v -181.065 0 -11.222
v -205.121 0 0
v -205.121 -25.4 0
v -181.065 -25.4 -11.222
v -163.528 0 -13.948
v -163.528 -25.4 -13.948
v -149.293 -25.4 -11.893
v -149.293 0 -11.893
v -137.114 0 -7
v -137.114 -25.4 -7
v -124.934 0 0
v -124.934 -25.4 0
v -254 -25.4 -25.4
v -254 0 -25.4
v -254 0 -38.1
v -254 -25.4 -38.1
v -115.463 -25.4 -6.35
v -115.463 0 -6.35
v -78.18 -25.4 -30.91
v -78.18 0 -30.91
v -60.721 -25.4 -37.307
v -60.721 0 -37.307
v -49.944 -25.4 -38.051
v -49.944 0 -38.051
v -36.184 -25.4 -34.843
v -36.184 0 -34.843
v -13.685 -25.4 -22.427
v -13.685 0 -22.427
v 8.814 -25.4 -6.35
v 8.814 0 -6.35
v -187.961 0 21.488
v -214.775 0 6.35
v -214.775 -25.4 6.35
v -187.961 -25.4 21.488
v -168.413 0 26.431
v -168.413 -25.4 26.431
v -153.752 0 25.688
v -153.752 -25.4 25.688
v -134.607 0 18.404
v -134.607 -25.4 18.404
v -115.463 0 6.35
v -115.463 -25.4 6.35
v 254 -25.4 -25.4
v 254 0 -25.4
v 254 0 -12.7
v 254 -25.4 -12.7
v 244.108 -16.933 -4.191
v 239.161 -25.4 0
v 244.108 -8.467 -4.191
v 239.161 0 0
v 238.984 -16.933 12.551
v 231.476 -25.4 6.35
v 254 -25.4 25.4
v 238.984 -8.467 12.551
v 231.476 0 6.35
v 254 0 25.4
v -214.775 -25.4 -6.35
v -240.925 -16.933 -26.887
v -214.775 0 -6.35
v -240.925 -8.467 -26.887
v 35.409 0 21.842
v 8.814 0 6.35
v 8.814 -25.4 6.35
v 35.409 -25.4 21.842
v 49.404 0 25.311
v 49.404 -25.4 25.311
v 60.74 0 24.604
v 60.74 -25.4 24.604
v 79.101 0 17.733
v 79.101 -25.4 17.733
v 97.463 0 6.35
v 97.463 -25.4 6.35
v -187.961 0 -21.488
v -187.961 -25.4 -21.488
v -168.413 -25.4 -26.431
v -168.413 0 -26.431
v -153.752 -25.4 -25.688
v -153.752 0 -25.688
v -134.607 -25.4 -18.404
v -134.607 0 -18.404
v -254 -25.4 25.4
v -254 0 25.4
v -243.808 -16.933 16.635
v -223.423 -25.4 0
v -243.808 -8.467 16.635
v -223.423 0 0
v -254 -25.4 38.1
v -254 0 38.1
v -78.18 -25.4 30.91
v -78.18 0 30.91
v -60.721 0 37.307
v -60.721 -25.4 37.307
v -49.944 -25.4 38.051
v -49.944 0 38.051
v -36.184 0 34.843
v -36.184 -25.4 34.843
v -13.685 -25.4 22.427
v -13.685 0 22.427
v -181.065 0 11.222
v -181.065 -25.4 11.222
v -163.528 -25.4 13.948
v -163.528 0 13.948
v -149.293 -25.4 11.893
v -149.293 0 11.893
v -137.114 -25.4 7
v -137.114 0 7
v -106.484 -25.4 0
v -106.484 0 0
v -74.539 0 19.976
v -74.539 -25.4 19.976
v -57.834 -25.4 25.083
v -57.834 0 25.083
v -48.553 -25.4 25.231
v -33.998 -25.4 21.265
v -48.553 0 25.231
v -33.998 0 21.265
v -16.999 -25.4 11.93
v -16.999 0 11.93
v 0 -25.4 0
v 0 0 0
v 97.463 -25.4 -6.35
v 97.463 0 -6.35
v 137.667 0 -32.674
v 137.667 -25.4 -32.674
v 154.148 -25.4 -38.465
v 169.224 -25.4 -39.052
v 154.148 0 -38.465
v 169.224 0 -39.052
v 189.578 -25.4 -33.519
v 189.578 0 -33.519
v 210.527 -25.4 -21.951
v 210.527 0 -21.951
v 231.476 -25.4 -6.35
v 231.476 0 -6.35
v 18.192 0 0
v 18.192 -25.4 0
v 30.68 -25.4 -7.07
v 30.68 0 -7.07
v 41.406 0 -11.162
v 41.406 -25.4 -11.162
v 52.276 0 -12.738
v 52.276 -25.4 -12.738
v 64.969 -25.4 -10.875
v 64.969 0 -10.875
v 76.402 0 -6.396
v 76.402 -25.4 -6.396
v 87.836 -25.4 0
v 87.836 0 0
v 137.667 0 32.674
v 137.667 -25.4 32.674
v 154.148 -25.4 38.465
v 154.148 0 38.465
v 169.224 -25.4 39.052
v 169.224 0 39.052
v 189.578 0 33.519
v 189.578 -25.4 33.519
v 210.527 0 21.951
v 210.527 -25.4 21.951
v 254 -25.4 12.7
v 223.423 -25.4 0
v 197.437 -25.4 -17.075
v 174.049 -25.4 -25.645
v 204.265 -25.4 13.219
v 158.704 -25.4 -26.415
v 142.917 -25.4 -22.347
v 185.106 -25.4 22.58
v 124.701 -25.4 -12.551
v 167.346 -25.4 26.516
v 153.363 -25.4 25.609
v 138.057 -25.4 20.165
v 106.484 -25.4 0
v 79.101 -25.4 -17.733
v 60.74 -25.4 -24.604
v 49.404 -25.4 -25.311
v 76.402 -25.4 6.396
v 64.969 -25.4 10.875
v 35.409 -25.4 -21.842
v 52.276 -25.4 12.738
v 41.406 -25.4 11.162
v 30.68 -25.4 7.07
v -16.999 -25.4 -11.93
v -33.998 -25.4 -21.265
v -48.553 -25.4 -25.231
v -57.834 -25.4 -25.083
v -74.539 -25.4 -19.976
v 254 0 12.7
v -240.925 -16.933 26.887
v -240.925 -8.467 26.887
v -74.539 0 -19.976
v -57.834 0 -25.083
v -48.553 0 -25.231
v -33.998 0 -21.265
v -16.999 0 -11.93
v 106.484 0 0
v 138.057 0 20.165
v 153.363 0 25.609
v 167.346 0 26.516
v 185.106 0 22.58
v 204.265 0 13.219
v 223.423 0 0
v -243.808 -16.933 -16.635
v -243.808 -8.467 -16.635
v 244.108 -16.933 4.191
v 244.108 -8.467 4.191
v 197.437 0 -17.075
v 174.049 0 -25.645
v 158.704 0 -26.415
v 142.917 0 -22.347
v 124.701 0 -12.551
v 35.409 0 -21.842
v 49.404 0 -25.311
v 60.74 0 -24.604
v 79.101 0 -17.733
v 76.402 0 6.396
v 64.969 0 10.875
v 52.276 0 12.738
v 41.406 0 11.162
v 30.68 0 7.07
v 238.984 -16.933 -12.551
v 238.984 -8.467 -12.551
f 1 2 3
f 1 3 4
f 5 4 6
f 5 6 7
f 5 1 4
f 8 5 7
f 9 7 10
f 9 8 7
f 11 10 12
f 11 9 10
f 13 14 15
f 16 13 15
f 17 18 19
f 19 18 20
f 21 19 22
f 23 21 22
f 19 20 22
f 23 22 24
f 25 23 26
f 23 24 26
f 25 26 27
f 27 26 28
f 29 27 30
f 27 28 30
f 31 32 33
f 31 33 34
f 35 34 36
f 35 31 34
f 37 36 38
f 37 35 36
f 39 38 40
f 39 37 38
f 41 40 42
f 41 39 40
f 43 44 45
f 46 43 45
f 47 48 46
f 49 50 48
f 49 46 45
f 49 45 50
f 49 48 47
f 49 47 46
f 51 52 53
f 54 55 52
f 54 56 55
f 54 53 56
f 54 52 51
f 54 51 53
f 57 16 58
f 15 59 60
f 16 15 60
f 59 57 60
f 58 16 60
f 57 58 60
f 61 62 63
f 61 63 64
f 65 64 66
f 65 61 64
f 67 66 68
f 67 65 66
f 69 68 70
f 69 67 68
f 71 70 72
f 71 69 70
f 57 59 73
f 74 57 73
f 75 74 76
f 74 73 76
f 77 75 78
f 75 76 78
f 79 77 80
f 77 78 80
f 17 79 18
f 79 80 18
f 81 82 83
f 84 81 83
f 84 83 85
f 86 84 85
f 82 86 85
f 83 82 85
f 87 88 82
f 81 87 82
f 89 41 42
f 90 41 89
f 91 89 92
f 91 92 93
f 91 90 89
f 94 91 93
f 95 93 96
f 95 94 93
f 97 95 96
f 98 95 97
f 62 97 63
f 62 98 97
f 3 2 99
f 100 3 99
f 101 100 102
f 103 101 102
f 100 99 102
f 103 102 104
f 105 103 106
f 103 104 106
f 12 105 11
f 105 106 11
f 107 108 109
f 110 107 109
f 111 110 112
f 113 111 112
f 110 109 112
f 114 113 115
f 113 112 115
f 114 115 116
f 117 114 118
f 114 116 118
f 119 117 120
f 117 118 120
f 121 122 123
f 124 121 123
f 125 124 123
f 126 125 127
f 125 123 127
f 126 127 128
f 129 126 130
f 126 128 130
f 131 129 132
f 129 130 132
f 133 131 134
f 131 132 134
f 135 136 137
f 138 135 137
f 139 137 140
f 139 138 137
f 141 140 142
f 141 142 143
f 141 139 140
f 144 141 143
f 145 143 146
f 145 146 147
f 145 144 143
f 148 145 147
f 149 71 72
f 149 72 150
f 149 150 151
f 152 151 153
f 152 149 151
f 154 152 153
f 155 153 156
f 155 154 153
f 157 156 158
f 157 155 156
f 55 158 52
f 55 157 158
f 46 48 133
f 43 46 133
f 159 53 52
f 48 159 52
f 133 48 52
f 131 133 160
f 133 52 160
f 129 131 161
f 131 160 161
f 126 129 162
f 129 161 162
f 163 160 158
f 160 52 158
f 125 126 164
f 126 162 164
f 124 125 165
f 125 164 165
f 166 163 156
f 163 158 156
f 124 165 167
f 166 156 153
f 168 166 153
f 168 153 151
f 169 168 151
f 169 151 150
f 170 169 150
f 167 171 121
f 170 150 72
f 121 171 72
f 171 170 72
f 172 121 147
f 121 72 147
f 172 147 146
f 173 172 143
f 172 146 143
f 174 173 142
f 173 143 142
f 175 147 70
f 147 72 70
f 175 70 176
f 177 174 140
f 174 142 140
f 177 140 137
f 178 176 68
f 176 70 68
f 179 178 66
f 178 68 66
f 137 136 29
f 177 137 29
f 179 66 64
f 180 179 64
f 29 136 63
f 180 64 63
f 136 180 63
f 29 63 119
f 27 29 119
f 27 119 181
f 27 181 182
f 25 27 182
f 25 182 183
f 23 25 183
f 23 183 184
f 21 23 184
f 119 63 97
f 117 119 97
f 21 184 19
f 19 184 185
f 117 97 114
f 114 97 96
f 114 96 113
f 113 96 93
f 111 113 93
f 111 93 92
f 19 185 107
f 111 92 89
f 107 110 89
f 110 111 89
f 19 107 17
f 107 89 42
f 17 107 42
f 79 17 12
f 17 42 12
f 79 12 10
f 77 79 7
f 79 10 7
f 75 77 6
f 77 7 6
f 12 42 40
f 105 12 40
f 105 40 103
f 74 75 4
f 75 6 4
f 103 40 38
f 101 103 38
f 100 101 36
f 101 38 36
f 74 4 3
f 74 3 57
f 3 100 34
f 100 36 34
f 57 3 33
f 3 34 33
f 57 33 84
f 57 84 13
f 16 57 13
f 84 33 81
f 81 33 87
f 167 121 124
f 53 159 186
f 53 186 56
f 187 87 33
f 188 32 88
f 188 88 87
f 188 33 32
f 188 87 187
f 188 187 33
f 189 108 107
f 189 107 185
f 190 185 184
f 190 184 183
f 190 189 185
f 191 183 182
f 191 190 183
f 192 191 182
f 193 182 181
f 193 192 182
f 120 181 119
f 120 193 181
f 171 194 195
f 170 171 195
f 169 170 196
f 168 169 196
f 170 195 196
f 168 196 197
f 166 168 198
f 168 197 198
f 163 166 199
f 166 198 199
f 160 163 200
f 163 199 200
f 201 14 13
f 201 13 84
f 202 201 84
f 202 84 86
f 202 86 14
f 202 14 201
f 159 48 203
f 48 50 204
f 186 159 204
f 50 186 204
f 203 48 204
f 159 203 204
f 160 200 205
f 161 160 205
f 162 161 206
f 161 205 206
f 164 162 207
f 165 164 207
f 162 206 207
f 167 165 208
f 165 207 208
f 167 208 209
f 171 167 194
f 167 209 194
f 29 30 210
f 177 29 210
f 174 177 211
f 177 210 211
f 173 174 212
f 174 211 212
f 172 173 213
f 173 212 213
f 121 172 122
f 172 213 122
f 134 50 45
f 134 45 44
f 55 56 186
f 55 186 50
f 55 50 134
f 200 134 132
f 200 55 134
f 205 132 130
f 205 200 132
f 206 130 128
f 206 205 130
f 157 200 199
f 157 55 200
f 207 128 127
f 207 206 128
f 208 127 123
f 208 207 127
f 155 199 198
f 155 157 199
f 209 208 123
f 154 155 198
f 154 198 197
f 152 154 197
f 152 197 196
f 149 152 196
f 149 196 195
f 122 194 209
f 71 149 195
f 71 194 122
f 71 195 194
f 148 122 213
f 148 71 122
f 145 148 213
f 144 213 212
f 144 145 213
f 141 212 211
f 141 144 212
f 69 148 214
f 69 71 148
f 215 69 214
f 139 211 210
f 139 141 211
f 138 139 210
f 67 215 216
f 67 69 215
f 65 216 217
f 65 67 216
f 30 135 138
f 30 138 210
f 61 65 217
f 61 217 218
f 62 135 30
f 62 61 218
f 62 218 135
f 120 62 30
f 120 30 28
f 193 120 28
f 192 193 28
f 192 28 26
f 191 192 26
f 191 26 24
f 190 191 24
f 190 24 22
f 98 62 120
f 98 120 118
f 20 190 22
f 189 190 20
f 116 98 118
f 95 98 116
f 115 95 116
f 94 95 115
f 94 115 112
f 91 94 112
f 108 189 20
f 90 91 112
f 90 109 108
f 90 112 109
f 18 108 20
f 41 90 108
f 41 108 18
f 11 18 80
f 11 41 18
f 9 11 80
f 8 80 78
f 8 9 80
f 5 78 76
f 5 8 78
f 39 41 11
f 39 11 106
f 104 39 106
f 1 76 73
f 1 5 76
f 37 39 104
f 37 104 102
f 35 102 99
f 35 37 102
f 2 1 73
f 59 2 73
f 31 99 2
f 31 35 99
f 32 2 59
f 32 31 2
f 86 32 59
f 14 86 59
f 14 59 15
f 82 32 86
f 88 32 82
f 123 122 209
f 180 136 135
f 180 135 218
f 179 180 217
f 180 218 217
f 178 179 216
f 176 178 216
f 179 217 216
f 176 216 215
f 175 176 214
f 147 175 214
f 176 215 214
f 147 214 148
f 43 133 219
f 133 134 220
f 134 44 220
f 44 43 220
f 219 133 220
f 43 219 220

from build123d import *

# Parameters (mm, degrees)
F1_DEPTH = 25.4


with BuildPart() as f1:
    # F0 (on Front) → F1 (new body)
    with BuildSketch(Plane.XZ):
        with BuildLine():
            add(Edge.make_bspline(
                [(-214.7751562029, -6.35), (-211.5570208021, -4.093973735), (-208.3388854013, -1.9667404666), (-205.1207500005, 0)],
                knots=[0.0772142594, 0.0772142594, 0.0772142594, 0.0772142594, 0.0962189961, 0.0962189961, 0.0962189961, 0.0962189961], degree=3))
            add(Edge.make_bspline(
                [(-214.7751562029, -6.35), (-193.9834374686, -20.9257271579), (-160.8792672429, -35.5732524158), (-127.7750970172, -14.9202237117), (-115.4626455258, -6.35)],
                knots=[0.0772142594, 0.0772142594, 0.0772142594, 0.0772142594, 0.2, 0.2727113277, 0.2727113277, 0.2727113277, 0.2727113277], degree=3))
            add(Edge.make_bspline(
                [(-124.933999452, 0), (-121.7768814766, -2.0133370092), (-118.6197635012, -4.1524516602), (-115.4626455258, -6.35)],
                knots=[0.2540669302, 0.2540669302, 0.2540669302, 0.2540669302, 0.2727113277, 0.2727113277, 0.2727113277, 0.2727113277], degree=3))
            add(Edge.make_bspline(
                [(-205.1207500005, 0), (-187.547166667, -10.7399699454), (-160.8182498175, -19.7958733422), (-134.089332968, -5.8384805203), (-124.933999452, 0)],
                knots=[0.0962189961, 0.0962189961, 0.0962189961, 0.0962189961, 0.2, 0.2540669302, 0.2540669302, 0.2540669302, 0.2540669302], degree=3))
        make_face()
        with BuildLine():
            add(Edge.make_bspline(
                [(-214.7751562029, 6.35), (-193.9834374686, 20.9257271579), (-160.8792672429, 35.5732524158), (-127.7750970172, 14.9202237117), (-115.4626455258, 6.35)],
                knots=[0.0772142594, 0.0772142594, 0.0772142594, 0.0772142594, 0.2, 0.2727113277, 0.2727113277, 0.2727113277, 0.2727113277], degree=3))
            add(Edge.make_bspline(
                [(-214.7751562029, 6.35), (-211.5570208021, 4.093973735), (-208.3388854013, 1.9667404666), (-205.1207500005, 0)],
                knots=[0.0772142594, 0.0772142594, 0.0772142594, 0.0772142594, 0.0962189961, 0.0962189961, 0.0962189961, 0.0962189961], degree=3))
            add(Edge.make_bspline(
                [(-205.1207500005, 0), (-187.547166667, 10.7399699454), (-160.8182498175, 19.7958733422), (-134.089332968, 5.8384805203), (-124.933999452, 0)],
                knots=[0.0962189961, 0.0962189961, 0.0962189961, 0.0962189961, 0.2, 0.2540669302, 0.2540669302, 0.2540669302, 0.2540669302], degree=3))
            add(Edge.make_bspline(
                [(-124.933999452, 0), (-121.7768814766, 2.0133370092), (-118.6197635012, 4.1524516602), (-115.4626455258, 6.35)],
                knots=[0.2540669302, 0.2540669302, 0.2540669302, 0.2540669302, 0.2727113277, 0.2727113277, 0.2727113277, 0.2727113277], degree=3))
        make_face()
        with BuildLine():
            add(Edge.make_bspline(
                [(-223.4234286462, 0), (-220.5406711651, 2.2048234714), (-217.657913684, 4.3290854694), (-214.7751562029, 6.35)],
                knots=[0.0601901011, 0.0601901011, 0.0601901011, 0.0601901011, 0.0772142594, 0.0772142594, 0.0772142594, 0.0772142594], degree=3))
            add(Edge.make_bspline(
                [(-223.4234286462, 0), (-220.5406711651, -2.2048234714), (-217.657913684, -4.3290854694), (-214.7751562029, -6.35)],
                knots=[0.0601901011, 0.0601901011, 0.0601901011, 0.0601901011, 0.0772142594, 0.0772142594, 0.0772142594, 0.0772142594], degree=3))
            add(Edge.make_bspline(
                [(-214.7751562029, -6.35), (-211.5570208021, -4.093973735), (-208.3388854013, -1.9667404666), (-205.1207500005, 0)],
                knots=[0.0772142594, 0.0772142594, 0.0772142594, 0.0772142594, 0.0962189961, 0.0962189961, 0.0962189961, 0.0962189961], degree=3))
            add(Edge.make_bspline(
                [(-214.7751562029, 6.35), (-211.5570208021, 4.093973735), (-208.3388854013, 1.9667404666), (-205.1207500005, 0)],
                knots=[0.0772142594, 0.0772142594, 0.0772142594, 0.0772142594, 0.0962189961, 0.0962189961, 0.0962189961, 0.0962189961], degree=3))
        make_face()
        with BuildLine():
            add(Edge.make_bspline(
                [(-254, -25.4), (-243.8078095487, -16.5976537012), (-233.6156190975, -7.7953074024), (-223.4234286462, 0)],
                knots=[0, 0, 0, 0, 0.0601901011, 0.0601901011, 0.0601901011, 0.0601901011], degree=3))
            Line((-254, -25.4), (-254, -38.1))
            add(Edge.make_bspline(
                [(-254, -38.1), (-240.9250520676, -26.807999513), (-227.8501041353, -15.5159990259), (-214.7751562029, -6.35)],
                knots=[0, 0, 0, 0, 0.0772142594, 0.0772142594, 0.0772142594, 0.0772142594], degree=3))
            add(Edge.make_bspline(
                [(-223.4234286462, 0), (-220.5406711651, -2.2048234714), (-217.657913684, -4.3290854694), (-214.7751562029, -6.35)],
                knots=[0.0601901011, 0.0601901011, 0.0601901011, 0.0601901011, 0.0772142594, 0.0772142594, 0.0772142594, 0.0772142594], degree=3))
        make_face()
        with BuildLine():
            add(Edge.make_bspline(
                [(-254, 25.4), (-243.8078095487, 16.5976537012), (-233.6156190975, 7.7953074024), (-223.4234286462, 0)],
                knots=[0, 0, 0, 0, 0.0601901011, 0.0601901011, 0.0601901011, 0.0601901011], degree=3))
            add(Edge.make_bspline(
                [(-223.4234286462, 0), (-220.5406711651, 2.2048234714), (-217.657913684, 4.3290854694), (-214.7751562029, 6.35)],
                knots=[0.0601901011, 0.0601901011, 0.0601901011, 0.0601901011, 0.0772142594, 0.0772142594, 0.0772142594, 0.0772142594], degree=3))
            add(Edge.make_bspline(
                [(-254, 38.1), (-240.9250520676, 26.807999513), (-227.8501041353, 15.5159990259), (-214.7751562029, 6.35)],
                knots=[0, 0, 0, 0, 0.0772142594, 0.0772142594, 0.0772142594, 0.0772142594], degree=3))
            Line((-254, 38.1), (-254, 25.4))
        make_face()
        with BuildLine():
            add(Edge.make_bspline(
                [(-115.4626455258, -6.35), (-112.4696958715, -4.2667229116), (-109.4767462173, -2.1309311697), (-106.4837965631, 0)],
                knots=[0.2727113277, 0.2727113277, 0.2727113277, 0.2727113277, 0.2903862272, 0.2903862272, 0.2903862272, 0.2903862272], degree=3))
            add(Edge.make_bspline(
                [(-115.4626455258, -6.35), (-93.9084303505, -21.3530597976), (-52.4828246794, -55.4224209823), (-11.0572190083, -20.3940403676), (8.8141714876, -6.35)],
                knots=[0.2727113277, 0.2727113277, 0.2727113277, 0.2727113277, 0.4, 0.5173507313, 0.5173507313, 0.5173507313, 0.5173507313], degree=3))
            add(Edge.make_bspline(
                [(0, 0), (2.9380571625, -2.1367688455), (5.8761143251, -4.273537691), (8.8141714876, -6.35)],
                knots=[0.5, 0.5, 0.5, 0.5, 0.5173507313, 0.5173507313, 0.5173507313, 0.5173507313], degree=3))
            add(Edge.make_bspline(
                [(-106.4837965631, 0), (-87.9225310421, -13.2153172678), (-52.4279321877, -38.1294052274), (-16.9333333333, -12.3151515152), (0, 0)],
                knots=[0.2903862272, 0.2903862272, 0.2903862272, 0.2903862272, 0.4, 0.5, 0.5, 0.5, 0.5], degree=3))
        make_face()
        with BuildLine():
            add(Edge.make_bspline(
                [(-115.4626455258, 6.35), (-112.4696958715, 4.2667229116), (-109.4767462173, 2.1309311697), (-106.4837965631, 0)],
                knots=[0.2727113277, 0.2727113277, 0.2727113277, 0.2727113277, 0.2903862272, 0.2903862272, 0.2903862272, 0.2903862272], degree=3))
            add(Edge.make_bspline(
                [(-124.933999452, 0), (-121.7768814766, 2.0133370092), (-118.6197635012, 4.1524516602), (-115.4626455258, 6.35)],
                knots=[0.2540669302, 0.2540669302, 0.2540669302, 0.2540669302, 0.2727113277, 0.2727113277, 0.2727113277, 0.2727113277], degree=3))
            add(Edge.make_bspline(
                [(-124.933999452, 0), (-121.7768814766, -2.0133370092), (-118.6197635012, -4.1524516602), (-115.4626455258, -6.35)],
                knots=[0.2540669302, 0.2540669302, 0.2540669302, 0.2540669302, 0.2727113277, 0.2727113277, 0.2727113277, 0.2727113277], degree=3))
            add(Edge.make_bspline(
                [(-115.4626455258, -6.35), (-112.4696958715, -4.2667229116), (-109.4767462173, -2.1309311697), (-106.4837965631, 0)],
                knots=[0.2727113277, 0.2727113277, 0.2727113277, 0.2727113277, 0.2903862272, 0.2903862272, 0.2903862272, 0.2903862272], degree=3))
        make_face()
        with BuildLine():
            add(Edge.make_bspline(
                [(-115.4626455258, 6.35), (-93.9084303505, 21.3530597976), (-52.4828246794, 55.4224209823), (-11.0572190083, 20.3940403676), (8.8141714876, 6.35)],
                knots=[0.2727113277, 0.2727113277, 0.2727113277, 0.2727113277, 0.4, 0.5173507313, 0.5173507313, 0.5173507313, 0.5173507313], degree=3))
            add(Edge.make_bspline(
                [(-115.4626455258, 6.35), (-112.4696958715, 4.2667229116), (-109.4767462173, 2.1309311697), (-106.4837965631, 0)],
                knots=[0.2727113277, 0.2727113277, 0.2727113277, 0.2727113277, 0.2903862272, 0.2903862272, 0.2903862272, 0.2903862272], degree=3))
            add(Edge.make_bspline(
                [(-106.4837965631, 0), (-87.9225310421, 13.2153172678), (-52.4279321877, 38.1294052274), (-16.9333333333, 12.3151515152), (0, 0)],
                knots=[0.2903862272, 0.2903862272, 0.2903862272, 0.2903862272, 0.4, 0.5, 0.5, 0.5, 0.5], degree=3))
            add(Edge.make_bspline(
                [(0, 0), (2.9380571625, 2.1367688455), (5.8761143251, 4.273537691), (8.8141714876, 6.35)],
                knots=[0.5, 0.5, 0.5, 0.5, 0.5173507313, 0.5173507313, 0.5173507313, 0.5173507313], degree=3))
        make_face()
        with BuildLine():
            add(Edge.make_bspline(
                [(8.8141714876, -6.35), (11.9399480407, -4.1408676244), (15.0657245938, -1.9999942239), (18.1915011468, 0)],
                knots=[0.5173507313, 0.5173507313, 0.5173507313, 0.5173507313, 0.5358100416, 0.5358100416, 0.5358100416, 0.5358100416], degree=3))
            add(Edge.make_bspline(
                [(8.8141714876, -6.35), (22.8094476584, -16.2411157495), (52.3589401975, -34.2359377937), (81.9084327366, -17.0725968822), (97.4626491049, -6.35)],
                knots=[0.5173507313, 0.5173507313, 0.5173507313, 0.5173507313, 0.6, 0.6918556085, 0.6918556085, 0.6918556085, 0.6918556085], degree=3))
            add(Edge.make_bspline(
                [(87.8360827577, 0), (91.0449382067, -1.9976776152), (94.2537936558, -4.1379140537), (97.4626491049, -6.35)],
                knots=[0.6729056747, 0.6729056747, 0.6729056747, 0.6729056747, 0.6918556085, 0.6918556085, 0.6918556085, 0.6918556085], degree=3))
            add(Edge.make_bspline(
                [(18.1915011468, 0), (29.0610007646, -6.9547314348), (52.2758613015, -18.1701405375), (75.4907218384, -7.6856223508), (87.8360827577, 0)],
                knots=[0.5358100416, 0.5358100416, 0.5358100416, 0.5358100416, 0.6, 0.6729056747, 0.6729056747, 0.6729056747, 0.6729056747], degree=3))
        make_face()
        with BuildLine():
            add(Edge.make_bspline(
                [(8.8141714876, 6.35), (22.8094476584, 16.2411157495), (52.3589401975, 34.2359377937), (81.9084327366, 17.0725968822), (97.4626491049, 6.35)],
                knots=[0.5173507313, 0.5173507313, 0.5173507313, 0.5173507313, 0.6, 0.6918556085, 0.6918556085, 0.6918556085, 0.6918556085], degree=3))
            add(Edge.make_bspline(
                [(8.8141714876, 6.35), (11.9399480407, 4.1408676244), (15.0657245938, 1.9999942239), (18.1915011468, 0)],
                knots=[0.5173507313, 0.5173507313, 0.5173507313, 0.5173507313, 0.5358100416, 0.5358100416, 0.5358100416, 0.5358100416], degree=3))
            add(Edge.make_bspline(
                [(18.1915011468, 0), (29.0610007646, 6.9547314348), (52.2758613015, 18.1701405375), (75.4907218384, 7.6856223508), (87.8360827577, 0)],
                knots=[0.5358100416, 0.5358100416, 0.5358100416, 0.5358100416, 0.6, 0.6729056747, 0.6729056747, 0.6729056747, 0.6729056747], degree=3))
            add(Edge.make_bspline(
                [(87.8360827577, 0), (91.0449382067, 1.9976776152), (94.2537936558, 4.1379140537), (97.4626491049, 6.35)],
                knots=[0.6729056747, 0.6729056747, 0.6729056747, 0.6729056747, 0.6918556085, 0.6918556085, 0.6918556085, 0.6918556085], degree=3))
        make_face()
        with BuildLine():
            add(Edge.make_bspline(
                [(8.8141714876, 6.35), (11.9399480407, 4.1408676244), (15.0657245938, 1.9999942239), (18.1915011468, 0)],
                knots=[0.5173507313, 0.5173507313, 0.5173507313, 0.5173507313, 0.5358100416, 0.5358100416, 0.5358100416, 0.5358100416], degree=3))
            add(Edge.make_bspline(
                [(0, 0), (2.9380571625, 2.1367688455), (5.8761143251, 4.273537691), (8.8141714876, 6.35)],
                knots=[0.5, 0.5, 0.5, 0.5, 0.5173507313, 0.5173507313, 0.5173507313, 0.5173507313], degree=3))
            add(Edge.make_bspline(
                [(0, 0), (2.9380571625, -2.1367688455), (5.8761143251, -4.273537691), (8.8141714876, -6.35)],
                knots=[0.5, 0.5, 0.5, 0.5, 0.5173507313, 0.5173507313, 0.5173507313, 0.5173507313], degree=3))
            add(Edge.make_bspline(
                [(8.8141714876, -6.35), (11.9399480407, -4.1408676244), (15.0657245938, -1.9999942239), (18.1915011468, 0)],
                knots=[0.5173507313, 0.5173507313, 0.5173507313, 0.5173507313, 0.5358100416, 0.5358100416, 0.5358100416, 0.5358100416], degree=3))
        make_face()
        with BuildLine():
            add(Edge.make_bspline(
                [(97.4626491049, -6.35), (100.4696982576, -4.2770330882), (103.4767474103, -2.1409697819), (106.4837965631, 0)],
                knots=[0.6918556085, 0.6918556085, 0.6918556085, 0.6918556085, 0.7096137728, 0.7096137728, 0.7096137728, 0.7096137728], degree=3))
            add(Edge.make_bspline(
                [(97.4626491049, -6.35), (115.7750994032, -18.974038256), (160.4462157888, -55.4770957998), (205.1173321744, -27.7010633214), (231.4759982616, -6.35)],
                knots=[0.6918556085, 0.6918556085, 0.6918556085, 0.6918556085, 0.8, 0.9556614139, 0.9556614139, 0.9556614139, 0.9556614139], degree=3))
            add(Edge.make_bspline(
                [(223.4234286462, 0), (226.107618518, -2.0529527266), (228.7918083898, -4.1757508278), (231.4759982616, -6.35)],
                knots=[0.9398098989, 0.9398098989, 0.9398098989, 0.9398098989, 0.9556614139, 0.9556614139, 0.9556614139, 0.9556614139], degree=3))
            add(Edge.make_bspline(
                [(106.4837965631, 0), (121.7891977087, -10.8971951197), (160.7690750698, -38.9739529901), (199.7489524308, -18.1069830447), (223.4234286462, 0)],
                knots=[0.7096137728, 0.7096137728, 0.7096137728, 0.7096137728, 0.8, 0.9398098989, 0.9398098989, 0.9398098989, 0.9398098989], degree=3))
        make_face()
        with BuildLine():
            add(Edge.make_bspline(
                [(97.4626491049, 6.35), (100.4696982576, 4.2770330882), (103.4767474103, 2.1409697819), (106.4837965631, 0)],
                knots=[0.6918556085, 0.6918556085, 0.6918556085, 0.6918556085, 0.7096137728, 0.7096137728, 0.7096137728, 0.7096137728], degree=3))
            add(Edge.make_bspline(
                [(87.8360827577, 0), (91.0449382067, 1.9976776152), (94.2537936558, 4.1379140537), (97.4626491049, 6.35)],
                knots=[0.6729056747, 0.6729056747, 0.6729056747, 0.6729056747, 0.6918556085, 0.6918556085, 0.6918556085, 0.6918556085], degree=3))
            add(Edge.make_bspline(
                [(87.8360827577, 0), (91.0449382067, -1.9976776152), (94.2537936558, -4.1379140537), (97.4626491049, -6.35)],
                knots=[0.6729056747, 0.6729056747, 0.6729056747, 0.6729056747, 0.6918556085, 0.6918556085, 0.6918556085, 0.6918556085], degree=3))
            add(Edge.make_bspline(
                [(97.4626491049, -6.35), (100.4696982576, -4.2770330882), (103.4767474103, -2.1409697819), (106.4837965631, 0)],
                knots=[0.6918556085, 0.6918556085, 0.6918556085, 0.6918556085, 0.7096137728, 0.7096137728, 0.7096137728, 0.7096137728], degree=3))
        make_face()
        with BuildLine():
            add(Edge.make_bspline(
                [(97.4626491049, 6.35), (115.7750994032, 18.974038256), (160.4462157888, 55.4770957998), (205.1173321744, 27.7010633214), (231.4759982616, 6.35)],
                knots=[0.6918556085, 0.6918556085, 0.6918556085, 0.6918556085, 0.8, 0.9556614139, 0.9556614139, 0.9556614139, 0.9556614139], degree=3))
            add(Edge.make_bspline(
                [(97.4626491049, 6.35), (100.4696982576, 4.2770330882), (103.4767474103, 2.1409697819), (106.4837965631, 0)],
                knots=[0.6918556085, 0.6918556085, 0.6918556085, 0.6918556085, 0.7096137728, 0.7096137728, 0.7096137728, 0.7096137728], degree=3))
            add(Edge.make_bspline(
                [(106.4837965631, 0), (121.7891977087, 10.8971951197), (160.7690750698, 38.9739529901), (199.7489524308, 18.1069830447), (223.4234286462, 0)],
                knots=[0.7096137728, 0.7096137728, 0.7096137728, 0.7096137728, 0.8, 0.9398098989, 0.9398098989, 0.9398098989, 0.9398098989], degree=3))
            add(Edge.make_bspline(
                [(223.4234286462, 0), (226.107618518, 2.0529527266), (228.7918083898, 4.1757508278), (231.4759982616, 6.35)],
                knots=[0.9398098989, 0.9398098989, 0.9398098989, 0.9398098989, 0.9556614139, 0.9556614139, 0.9556614139, 0.9556614139], degree=3))
        make_face()
        with BuildLine():
            add(Edge.make_bspline(
                [(231.4759982616, -6.35), (234.0378222269, -4.2748697365), (236.5996461922, -2.1528725416), (239.1614701575, 0)],
                knots=[0.9556614139, 0.9556614139, 0.9556614139, 0.9556614139, 0.9707902956, 0.9707902956, 0.9707902956, 0.9707902956], degree=3))
            add(Edge.make_bspline(
                [(231.4759982616, -6.35), (238.983998841, -12.4316353627), (246.4919994205, -18.9158176814), (254, -25.4)],
                knots=[0.9556614139, 0.9556614139, 0.9556614139, 0.9556614139, 1, 1, 1, 1], degree=3))
            Line((254, -25.4), (254, -12.7))
            add(Edge.make_bspline(
                [(239.1614701575, 0), (244.1076467717, -4.1566040301), (249.0538233858, -8.428302015), (254, -12.7)],
                knots=[0.9707902956, 0.9707902956, 0.9707902956, 0.9707902956, 1, 1, 1, 1], degree=3))
        make_face()
        with BuildLine():
            add(Edge.make_bspline(
                [(231.4759982616, 6.35), (238.983998841, 12.4316353627), (246.4919994205, 18.9158176814), (254, 25.4)],
                knots=[0.9556614139, 0.9556614139, 0.9556614139, 0.9556614139, 1, 1, 1, 1], degree=3))
            add(Edge.make_bspline(
                [(231.4759982616, 6.35), (234.0378222269, 4.2748697365), (236.5996461922, 2.1528725416), (239.1614701575, 0)],
                knots=[0.9556614139, 0.9556614139, 0.9556614139, 0.9556614139, 0.9707902956, 0.9707902956, 0.9707902956, 0.9707902956], degree=3))
            add(Edge.make_bspline(
                [(239.1614701575, 0), (244.1076467717, 4.1566040301), (249.0538233858, 8.428302015), (254, 12.7)],
                knots=[0.9707902956, 0.9707902956, 0.9707902956, 0.9707902956, 1, 1, 1, 1], degree=3))
            Line((254, 12.7), (254, 25.4))
        make_face()
        with BuildLine():
            add(Edge.make_bspline(
                [(231.4759982616, 6.35), (234.0378222269, 4.2748697365), (236.5996461922, 2.1528725416), (239.1614701575, 0)],
                knots=[0.9556614139, 0.9556614139, 0.9556614139, 0.9556614139, 0.9707902956, 0.9707902956, 0.9707902956, 0.9707902956], degree=3))
            add(Edge.make_bspline(
                [(223.4234286462, 0), (226.107618518, 2.0529527266), (228.7918083898, 4.1757508278), (231.4759982616, 6.35)],
                knots=[0.9398098989, 0.9398098989, 0.9398098989, 0.9398098989, 0.9556614139, 0.9556614139, 0.9556614139, 0.9556614139], degree=3))
            add(Edge.make_bspline(
                [(223.4234286462, 0), (226.107618518, -2.0529527266), (228.7918083898, -4.1757508278), (231.4759982616, -6.35)],
                knots=[0.9398098989, 0.9398098989, 0.9398098989, 0.9398098989, 0.9556614139, 0.9556614139, 0.9556614139, 0.9556614139], degree=3))
            add(Edge.make_bspline(
                [(231.4759982616, -6.35), (234.0378222269, -4.2748697365), (236.5996461922, -2.1528725416), (239.1614701575, 0)],
                knots=[0.9556614139, 0.9556614139, 0.9556614139, 0.9556614139, 0.9707902956, 0.9707902956, 0.9707902956, 0.9707902956], degree=3))
        make_face()
    extrude(amount=F1_DEPTH)


solid = f1.part
